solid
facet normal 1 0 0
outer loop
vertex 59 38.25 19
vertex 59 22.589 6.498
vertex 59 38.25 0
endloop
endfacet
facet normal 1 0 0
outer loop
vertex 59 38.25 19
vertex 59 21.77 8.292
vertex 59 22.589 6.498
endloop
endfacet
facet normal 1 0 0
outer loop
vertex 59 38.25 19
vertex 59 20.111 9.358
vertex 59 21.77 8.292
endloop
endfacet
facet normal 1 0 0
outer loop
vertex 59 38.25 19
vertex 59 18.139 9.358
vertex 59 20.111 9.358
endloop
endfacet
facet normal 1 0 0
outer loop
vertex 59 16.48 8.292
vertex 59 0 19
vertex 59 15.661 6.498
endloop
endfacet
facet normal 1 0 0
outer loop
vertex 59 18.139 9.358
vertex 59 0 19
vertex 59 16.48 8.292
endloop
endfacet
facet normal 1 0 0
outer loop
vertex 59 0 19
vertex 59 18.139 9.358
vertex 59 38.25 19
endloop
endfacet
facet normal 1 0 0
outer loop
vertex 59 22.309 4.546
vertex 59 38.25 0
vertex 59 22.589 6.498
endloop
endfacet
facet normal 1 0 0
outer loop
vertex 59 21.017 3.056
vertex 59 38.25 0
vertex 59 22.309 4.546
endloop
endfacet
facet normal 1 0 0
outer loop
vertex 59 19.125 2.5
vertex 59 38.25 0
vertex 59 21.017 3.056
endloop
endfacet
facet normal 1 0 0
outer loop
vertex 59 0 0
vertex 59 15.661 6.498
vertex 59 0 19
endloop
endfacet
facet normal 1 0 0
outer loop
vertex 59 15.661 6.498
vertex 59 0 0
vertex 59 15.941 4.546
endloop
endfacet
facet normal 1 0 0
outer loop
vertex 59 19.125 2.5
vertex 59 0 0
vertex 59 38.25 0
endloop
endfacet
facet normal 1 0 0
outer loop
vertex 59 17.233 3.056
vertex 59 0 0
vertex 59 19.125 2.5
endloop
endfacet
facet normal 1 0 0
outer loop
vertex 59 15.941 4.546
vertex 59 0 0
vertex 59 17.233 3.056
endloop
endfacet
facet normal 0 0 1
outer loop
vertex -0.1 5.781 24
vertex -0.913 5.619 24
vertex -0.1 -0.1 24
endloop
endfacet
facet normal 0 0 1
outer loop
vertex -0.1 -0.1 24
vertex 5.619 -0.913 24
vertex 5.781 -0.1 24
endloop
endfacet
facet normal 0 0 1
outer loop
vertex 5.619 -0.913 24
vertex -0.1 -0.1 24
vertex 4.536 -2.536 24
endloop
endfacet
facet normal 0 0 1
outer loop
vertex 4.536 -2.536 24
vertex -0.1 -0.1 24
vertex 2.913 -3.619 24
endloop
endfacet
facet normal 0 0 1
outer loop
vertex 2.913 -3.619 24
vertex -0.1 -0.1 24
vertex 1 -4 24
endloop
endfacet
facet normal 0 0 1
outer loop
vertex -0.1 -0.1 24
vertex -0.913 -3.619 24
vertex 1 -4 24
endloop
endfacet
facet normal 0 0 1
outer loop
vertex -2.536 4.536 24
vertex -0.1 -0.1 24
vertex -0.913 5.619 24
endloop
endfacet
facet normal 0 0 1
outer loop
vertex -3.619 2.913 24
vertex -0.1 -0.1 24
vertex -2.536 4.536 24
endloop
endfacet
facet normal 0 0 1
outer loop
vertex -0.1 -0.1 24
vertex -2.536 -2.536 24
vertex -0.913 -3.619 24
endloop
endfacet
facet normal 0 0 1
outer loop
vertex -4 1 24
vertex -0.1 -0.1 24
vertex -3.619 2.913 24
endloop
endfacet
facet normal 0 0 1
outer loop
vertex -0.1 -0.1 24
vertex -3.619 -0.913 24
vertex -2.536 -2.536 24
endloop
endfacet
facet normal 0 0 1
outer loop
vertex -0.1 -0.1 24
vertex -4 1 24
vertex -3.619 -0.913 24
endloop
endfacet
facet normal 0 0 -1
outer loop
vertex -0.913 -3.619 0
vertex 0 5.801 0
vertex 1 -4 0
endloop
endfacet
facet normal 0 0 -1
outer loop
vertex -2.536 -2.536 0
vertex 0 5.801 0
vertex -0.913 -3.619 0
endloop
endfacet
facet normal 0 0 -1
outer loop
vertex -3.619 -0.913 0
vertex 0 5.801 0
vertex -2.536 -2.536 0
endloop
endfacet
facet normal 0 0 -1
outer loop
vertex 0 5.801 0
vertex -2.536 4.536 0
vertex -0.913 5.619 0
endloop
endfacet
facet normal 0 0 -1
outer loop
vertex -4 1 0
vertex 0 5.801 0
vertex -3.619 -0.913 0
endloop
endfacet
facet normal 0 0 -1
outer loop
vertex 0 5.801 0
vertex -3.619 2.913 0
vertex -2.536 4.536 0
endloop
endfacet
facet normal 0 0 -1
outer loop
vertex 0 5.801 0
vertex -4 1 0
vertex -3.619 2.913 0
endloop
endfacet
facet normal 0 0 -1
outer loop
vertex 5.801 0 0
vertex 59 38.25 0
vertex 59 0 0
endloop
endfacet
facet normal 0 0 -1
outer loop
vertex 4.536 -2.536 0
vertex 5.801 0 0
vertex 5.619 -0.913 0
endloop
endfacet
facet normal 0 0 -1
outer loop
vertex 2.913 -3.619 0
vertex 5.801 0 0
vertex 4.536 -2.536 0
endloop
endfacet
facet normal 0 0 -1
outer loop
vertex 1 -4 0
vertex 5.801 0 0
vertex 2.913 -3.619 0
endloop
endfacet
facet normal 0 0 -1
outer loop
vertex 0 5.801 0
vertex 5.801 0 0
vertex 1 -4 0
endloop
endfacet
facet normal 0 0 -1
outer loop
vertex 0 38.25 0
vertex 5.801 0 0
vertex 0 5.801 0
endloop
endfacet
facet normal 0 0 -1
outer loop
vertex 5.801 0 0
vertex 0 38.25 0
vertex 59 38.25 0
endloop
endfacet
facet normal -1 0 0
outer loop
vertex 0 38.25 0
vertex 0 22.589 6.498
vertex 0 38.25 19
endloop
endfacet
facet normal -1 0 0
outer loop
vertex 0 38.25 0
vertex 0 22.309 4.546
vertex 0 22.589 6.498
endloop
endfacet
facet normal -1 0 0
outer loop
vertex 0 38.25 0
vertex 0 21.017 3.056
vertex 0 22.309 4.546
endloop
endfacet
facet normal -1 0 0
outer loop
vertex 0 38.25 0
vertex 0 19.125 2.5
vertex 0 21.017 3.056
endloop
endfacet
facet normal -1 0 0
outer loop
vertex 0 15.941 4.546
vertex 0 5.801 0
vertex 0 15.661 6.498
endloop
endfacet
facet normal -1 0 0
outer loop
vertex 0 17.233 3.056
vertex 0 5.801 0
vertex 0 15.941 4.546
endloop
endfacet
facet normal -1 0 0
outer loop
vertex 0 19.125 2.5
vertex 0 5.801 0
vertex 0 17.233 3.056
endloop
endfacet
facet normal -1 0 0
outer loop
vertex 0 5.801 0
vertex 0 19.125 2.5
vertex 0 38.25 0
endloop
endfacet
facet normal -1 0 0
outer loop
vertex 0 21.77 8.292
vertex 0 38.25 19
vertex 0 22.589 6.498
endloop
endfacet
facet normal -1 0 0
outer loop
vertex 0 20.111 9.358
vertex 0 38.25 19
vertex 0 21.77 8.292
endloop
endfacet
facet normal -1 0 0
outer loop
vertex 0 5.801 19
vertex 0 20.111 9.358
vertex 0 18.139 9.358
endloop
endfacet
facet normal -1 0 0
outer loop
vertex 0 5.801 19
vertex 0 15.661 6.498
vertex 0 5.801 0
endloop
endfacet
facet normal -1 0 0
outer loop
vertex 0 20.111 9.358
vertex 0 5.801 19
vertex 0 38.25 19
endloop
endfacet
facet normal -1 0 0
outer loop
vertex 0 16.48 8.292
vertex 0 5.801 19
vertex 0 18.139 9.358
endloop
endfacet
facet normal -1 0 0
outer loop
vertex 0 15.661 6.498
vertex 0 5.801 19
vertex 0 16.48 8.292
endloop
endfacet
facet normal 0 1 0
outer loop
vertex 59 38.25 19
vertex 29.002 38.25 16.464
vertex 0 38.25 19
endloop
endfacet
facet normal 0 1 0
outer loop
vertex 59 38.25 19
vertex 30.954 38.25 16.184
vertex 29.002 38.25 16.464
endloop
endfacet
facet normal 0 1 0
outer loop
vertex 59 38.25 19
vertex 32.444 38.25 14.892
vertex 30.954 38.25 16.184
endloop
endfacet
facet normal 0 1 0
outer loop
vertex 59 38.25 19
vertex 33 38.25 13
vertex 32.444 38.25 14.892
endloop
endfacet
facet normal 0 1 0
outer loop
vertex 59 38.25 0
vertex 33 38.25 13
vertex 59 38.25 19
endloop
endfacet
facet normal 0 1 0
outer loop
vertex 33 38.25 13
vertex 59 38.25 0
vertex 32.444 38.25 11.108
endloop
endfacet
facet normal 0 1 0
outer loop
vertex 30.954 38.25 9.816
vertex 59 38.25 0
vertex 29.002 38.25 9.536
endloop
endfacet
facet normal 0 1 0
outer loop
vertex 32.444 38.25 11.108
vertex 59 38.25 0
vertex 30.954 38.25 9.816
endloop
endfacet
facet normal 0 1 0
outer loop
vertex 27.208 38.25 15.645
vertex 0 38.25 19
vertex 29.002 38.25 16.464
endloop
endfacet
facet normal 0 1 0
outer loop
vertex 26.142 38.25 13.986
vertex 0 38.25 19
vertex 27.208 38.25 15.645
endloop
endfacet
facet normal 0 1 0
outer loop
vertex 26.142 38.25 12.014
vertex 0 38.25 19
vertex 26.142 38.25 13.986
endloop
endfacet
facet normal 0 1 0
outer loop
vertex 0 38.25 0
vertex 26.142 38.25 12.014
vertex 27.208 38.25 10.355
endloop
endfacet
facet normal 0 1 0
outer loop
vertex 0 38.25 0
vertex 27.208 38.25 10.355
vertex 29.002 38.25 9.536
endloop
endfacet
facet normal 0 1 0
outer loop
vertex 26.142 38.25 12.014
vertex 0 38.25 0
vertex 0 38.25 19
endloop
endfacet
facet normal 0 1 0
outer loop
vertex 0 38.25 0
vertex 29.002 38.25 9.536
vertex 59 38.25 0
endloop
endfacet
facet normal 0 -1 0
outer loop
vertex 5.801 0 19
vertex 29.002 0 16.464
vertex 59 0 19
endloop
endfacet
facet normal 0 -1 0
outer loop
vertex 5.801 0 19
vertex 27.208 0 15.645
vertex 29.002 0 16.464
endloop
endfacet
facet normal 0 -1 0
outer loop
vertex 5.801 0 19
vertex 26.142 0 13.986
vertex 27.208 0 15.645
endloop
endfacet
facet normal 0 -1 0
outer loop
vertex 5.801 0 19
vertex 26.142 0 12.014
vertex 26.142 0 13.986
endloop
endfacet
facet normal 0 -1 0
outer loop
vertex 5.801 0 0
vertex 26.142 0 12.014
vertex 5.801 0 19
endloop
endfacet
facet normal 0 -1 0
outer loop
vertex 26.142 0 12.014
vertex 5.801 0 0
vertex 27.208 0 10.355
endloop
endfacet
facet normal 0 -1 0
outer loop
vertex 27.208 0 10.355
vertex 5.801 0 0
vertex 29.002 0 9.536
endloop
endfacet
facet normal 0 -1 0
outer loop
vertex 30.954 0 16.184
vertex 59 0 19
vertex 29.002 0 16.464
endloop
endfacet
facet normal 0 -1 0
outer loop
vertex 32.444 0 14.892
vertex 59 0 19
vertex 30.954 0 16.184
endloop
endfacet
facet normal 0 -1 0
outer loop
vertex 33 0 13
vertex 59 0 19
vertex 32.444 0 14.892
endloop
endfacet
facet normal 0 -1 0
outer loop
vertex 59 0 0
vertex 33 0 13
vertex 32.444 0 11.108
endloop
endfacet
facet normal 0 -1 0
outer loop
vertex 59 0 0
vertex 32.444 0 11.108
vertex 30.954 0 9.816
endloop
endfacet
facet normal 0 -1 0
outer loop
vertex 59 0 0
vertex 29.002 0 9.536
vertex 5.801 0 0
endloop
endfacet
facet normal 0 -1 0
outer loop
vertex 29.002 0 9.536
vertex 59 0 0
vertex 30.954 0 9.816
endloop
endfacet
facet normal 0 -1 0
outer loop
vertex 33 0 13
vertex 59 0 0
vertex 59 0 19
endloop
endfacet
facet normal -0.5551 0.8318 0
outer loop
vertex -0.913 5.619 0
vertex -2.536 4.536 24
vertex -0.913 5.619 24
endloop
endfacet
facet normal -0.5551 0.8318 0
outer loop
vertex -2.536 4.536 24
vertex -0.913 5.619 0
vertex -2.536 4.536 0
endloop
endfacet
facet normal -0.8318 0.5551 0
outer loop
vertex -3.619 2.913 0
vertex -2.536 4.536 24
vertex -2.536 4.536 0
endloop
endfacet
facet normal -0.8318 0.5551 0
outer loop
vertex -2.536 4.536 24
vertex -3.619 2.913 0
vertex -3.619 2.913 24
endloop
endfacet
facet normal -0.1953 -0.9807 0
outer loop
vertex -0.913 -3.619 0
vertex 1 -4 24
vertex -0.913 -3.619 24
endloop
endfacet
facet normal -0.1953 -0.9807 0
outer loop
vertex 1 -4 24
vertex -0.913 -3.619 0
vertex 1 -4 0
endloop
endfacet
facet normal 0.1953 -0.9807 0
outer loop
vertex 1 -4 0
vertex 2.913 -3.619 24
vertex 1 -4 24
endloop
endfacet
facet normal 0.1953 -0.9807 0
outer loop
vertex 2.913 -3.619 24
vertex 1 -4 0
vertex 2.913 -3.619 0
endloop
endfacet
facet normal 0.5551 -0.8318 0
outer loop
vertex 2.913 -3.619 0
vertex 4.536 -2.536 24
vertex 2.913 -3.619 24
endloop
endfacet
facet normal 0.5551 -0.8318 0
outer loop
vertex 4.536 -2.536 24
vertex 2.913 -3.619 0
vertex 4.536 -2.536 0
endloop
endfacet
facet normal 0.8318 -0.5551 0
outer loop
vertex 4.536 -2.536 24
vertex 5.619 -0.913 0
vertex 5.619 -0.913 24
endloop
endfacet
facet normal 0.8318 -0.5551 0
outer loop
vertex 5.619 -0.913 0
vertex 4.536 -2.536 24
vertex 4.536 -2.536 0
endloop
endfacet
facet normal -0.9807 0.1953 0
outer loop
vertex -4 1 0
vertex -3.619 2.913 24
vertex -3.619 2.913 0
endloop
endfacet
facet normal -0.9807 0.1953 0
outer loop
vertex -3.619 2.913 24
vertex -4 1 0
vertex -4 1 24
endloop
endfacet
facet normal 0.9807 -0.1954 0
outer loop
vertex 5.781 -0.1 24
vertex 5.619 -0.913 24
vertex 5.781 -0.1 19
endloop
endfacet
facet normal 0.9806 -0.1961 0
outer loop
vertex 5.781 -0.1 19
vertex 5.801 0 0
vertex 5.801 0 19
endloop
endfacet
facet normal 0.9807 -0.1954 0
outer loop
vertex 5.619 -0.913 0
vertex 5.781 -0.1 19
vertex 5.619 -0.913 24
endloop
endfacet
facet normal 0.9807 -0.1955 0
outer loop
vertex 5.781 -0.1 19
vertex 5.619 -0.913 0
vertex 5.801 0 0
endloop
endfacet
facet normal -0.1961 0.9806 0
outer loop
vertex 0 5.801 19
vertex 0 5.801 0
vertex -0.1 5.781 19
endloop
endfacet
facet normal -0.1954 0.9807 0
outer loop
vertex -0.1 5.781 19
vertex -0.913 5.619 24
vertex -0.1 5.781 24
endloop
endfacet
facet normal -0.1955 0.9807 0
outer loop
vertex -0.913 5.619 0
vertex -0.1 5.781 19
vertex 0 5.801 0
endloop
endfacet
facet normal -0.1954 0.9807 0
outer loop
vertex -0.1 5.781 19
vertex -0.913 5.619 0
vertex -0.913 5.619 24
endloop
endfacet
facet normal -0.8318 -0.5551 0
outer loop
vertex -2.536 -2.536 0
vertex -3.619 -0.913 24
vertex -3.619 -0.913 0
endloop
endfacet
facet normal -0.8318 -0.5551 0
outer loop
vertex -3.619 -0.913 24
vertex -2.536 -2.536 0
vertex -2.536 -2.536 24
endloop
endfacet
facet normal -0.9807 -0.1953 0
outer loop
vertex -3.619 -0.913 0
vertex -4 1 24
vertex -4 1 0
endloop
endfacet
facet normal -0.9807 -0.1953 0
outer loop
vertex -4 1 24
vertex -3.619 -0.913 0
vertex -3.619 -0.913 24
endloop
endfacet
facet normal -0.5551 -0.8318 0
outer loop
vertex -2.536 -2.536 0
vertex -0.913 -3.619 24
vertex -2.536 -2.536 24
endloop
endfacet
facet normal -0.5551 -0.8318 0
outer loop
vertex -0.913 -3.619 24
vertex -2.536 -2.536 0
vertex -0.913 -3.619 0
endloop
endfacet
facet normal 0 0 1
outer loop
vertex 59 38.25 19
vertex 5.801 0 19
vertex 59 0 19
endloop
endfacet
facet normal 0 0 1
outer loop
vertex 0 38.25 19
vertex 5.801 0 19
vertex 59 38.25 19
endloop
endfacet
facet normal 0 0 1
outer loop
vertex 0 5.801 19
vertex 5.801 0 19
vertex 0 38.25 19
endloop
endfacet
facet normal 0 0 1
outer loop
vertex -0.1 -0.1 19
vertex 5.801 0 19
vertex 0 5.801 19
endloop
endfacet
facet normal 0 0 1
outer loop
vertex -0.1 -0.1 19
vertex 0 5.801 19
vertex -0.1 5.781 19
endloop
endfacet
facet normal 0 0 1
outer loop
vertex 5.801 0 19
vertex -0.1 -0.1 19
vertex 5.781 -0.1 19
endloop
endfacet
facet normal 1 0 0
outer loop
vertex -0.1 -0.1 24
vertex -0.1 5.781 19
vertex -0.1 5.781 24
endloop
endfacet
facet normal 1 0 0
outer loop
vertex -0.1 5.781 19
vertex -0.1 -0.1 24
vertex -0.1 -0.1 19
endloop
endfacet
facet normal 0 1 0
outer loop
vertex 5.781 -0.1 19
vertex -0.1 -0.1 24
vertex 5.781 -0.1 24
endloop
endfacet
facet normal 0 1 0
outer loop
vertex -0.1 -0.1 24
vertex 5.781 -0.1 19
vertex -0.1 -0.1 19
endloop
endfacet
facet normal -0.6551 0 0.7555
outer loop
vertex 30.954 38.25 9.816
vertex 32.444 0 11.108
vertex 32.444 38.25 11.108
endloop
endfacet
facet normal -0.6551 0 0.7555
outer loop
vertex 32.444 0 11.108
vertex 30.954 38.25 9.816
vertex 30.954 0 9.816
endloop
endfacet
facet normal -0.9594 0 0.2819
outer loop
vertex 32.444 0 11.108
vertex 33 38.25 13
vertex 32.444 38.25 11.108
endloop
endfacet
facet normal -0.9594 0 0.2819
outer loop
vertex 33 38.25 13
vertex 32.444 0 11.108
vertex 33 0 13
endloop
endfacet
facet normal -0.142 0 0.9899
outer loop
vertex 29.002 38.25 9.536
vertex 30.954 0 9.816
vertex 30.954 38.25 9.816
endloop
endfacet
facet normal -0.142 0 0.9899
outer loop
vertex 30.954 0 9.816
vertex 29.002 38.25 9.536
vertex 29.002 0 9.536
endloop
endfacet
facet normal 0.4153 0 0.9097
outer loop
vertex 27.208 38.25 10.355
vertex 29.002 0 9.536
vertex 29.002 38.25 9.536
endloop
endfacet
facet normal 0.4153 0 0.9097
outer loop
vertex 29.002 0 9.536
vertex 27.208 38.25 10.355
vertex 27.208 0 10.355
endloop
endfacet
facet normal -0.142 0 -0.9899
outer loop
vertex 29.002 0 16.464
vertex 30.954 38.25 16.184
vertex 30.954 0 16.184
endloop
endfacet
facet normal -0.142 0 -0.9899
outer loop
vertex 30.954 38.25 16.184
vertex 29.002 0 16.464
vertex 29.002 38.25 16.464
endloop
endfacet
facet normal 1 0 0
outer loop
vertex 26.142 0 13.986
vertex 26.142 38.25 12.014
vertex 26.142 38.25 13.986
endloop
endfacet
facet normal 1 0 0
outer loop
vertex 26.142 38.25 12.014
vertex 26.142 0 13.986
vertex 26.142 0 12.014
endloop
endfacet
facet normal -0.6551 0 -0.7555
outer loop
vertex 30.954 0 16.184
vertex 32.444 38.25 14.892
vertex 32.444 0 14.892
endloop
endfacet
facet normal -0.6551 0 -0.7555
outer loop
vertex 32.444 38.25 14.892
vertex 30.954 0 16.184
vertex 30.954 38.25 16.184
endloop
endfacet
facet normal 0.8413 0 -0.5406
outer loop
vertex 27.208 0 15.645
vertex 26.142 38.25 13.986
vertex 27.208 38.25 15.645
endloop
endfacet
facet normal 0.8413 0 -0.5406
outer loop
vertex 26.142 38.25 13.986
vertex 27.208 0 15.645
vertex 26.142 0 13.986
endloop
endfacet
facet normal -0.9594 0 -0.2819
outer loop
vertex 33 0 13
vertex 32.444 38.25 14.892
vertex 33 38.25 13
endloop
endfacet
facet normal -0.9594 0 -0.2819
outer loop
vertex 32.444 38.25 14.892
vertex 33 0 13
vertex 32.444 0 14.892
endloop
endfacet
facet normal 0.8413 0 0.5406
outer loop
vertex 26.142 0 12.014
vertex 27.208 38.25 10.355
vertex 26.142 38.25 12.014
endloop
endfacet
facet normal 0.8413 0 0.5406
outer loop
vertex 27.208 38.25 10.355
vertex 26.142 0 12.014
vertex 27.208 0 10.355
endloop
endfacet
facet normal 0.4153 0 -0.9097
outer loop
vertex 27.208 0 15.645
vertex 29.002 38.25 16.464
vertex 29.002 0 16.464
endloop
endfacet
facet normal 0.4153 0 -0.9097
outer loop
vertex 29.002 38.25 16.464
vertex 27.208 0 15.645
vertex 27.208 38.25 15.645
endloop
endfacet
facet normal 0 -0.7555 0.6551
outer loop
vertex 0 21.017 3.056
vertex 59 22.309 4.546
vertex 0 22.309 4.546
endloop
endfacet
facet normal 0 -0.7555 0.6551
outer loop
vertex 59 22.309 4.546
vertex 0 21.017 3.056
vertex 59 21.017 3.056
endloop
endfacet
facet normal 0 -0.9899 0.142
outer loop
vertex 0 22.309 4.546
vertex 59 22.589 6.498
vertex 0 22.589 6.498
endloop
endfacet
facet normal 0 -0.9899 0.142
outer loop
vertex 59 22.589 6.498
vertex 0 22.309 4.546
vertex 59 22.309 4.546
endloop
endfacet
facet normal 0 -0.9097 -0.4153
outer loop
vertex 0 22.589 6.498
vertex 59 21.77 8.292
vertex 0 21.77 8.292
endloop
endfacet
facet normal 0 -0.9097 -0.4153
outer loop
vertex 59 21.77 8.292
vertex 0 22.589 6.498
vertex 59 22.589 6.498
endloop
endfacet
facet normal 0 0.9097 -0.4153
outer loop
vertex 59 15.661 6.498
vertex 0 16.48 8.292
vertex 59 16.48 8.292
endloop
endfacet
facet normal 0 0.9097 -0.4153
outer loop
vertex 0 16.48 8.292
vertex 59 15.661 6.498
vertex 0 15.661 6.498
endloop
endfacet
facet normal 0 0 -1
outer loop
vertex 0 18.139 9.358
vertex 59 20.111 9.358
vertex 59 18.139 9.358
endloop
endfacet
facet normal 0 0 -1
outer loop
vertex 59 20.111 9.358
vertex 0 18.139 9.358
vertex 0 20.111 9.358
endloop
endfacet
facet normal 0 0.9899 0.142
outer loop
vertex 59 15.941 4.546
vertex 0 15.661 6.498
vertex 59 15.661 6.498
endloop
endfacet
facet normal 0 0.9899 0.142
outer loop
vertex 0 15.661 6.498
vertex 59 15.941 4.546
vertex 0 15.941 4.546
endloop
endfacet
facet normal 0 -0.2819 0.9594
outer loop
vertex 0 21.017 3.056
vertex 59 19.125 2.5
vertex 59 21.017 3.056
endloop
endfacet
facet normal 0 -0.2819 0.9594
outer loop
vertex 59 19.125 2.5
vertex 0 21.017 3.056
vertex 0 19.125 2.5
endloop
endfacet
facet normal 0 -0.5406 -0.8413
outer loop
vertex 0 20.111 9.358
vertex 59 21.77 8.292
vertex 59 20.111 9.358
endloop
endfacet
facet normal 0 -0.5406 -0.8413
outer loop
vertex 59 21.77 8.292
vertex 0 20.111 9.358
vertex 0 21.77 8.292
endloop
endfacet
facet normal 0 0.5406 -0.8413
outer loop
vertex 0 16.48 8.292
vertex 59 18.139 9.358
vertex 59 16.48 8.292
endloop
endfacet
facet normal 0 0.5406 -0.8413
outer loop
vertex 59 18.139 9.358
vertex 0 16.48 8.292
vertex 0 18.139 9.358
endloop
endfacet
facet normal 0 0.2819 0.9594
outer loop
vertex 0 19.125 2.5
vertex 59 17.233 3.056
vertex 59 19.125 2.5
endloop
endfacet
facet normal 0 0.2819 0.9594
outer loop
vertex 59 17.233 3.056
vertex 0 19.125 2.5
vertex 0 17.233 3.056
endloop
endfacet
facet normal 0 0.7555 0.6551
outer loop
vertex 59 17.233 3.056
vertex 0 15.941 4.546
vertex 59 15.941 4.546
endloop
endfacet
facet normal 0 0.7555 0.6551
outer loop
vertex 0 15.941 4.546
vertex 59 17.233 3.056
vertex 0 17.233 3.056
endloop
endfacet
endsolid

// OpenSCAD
/**
Glass build plate holder 4-piece
**/

/* [Main] */
// Width of build plate (mm)
plate_width = 153; //[100:400]
// Length of build plate (mm)
plate_length = 236; //[100:400]
// Thickness of build plate (mm), may want to set this to slightly less than actual thickness
plate_thickness = 5; //[2:8]
// Side of support to print, 2 of each side required for full support
side = "left"; //[left, right]
/* [Extras] */
// Diameter of holes for threaded rod
hole_diameter = 7; //[4:10]
/* [Hidden] */
support_height = plate_thickness+(hole_diameter*2)+5;
support_diameter = plate_thickness*2;

cornerbase();

module cornerbase() {
  difference() {
    union() {
      cube([plate_length/4,plate_width/4,support_height]);
      if (side == "left") {
        translate([plate_thickness*0.2,plate_thickness*0.2,0])
          cylinder(r=support_diameter/2,h=support_height);
      } else if (side == "right") {
        translate([(plate_length/4)-(plate_thickness*0.2),plate_thickness*0.2,0])
          cylinder(r=support_diameter/2,h=support_height);
      } else {
        echo("WARNING: No Support column created, must specify left or right side!");
      }
    }
    translate([-0.1,-0.1,support_height-plate_thickness])
      cube([(plate_length/4)+1,(plate_width/4)+1,plate_thickness+1]);
    translate([plate_length/8,-0.1,(support_height-plate_thickness)/2+(hole_diameter/2)])
      rotate([270,0,0])
        cylinder(r=hole_diameter/2,h=plate_length);
    translate([-0.1,plate_width/8,(support_height-plate_thickness)/2-(hole_diameter/2)])
      rotate([0,90,0])
        cylinder(r=hole_diameter/2,h=plate_length);
  }
}
